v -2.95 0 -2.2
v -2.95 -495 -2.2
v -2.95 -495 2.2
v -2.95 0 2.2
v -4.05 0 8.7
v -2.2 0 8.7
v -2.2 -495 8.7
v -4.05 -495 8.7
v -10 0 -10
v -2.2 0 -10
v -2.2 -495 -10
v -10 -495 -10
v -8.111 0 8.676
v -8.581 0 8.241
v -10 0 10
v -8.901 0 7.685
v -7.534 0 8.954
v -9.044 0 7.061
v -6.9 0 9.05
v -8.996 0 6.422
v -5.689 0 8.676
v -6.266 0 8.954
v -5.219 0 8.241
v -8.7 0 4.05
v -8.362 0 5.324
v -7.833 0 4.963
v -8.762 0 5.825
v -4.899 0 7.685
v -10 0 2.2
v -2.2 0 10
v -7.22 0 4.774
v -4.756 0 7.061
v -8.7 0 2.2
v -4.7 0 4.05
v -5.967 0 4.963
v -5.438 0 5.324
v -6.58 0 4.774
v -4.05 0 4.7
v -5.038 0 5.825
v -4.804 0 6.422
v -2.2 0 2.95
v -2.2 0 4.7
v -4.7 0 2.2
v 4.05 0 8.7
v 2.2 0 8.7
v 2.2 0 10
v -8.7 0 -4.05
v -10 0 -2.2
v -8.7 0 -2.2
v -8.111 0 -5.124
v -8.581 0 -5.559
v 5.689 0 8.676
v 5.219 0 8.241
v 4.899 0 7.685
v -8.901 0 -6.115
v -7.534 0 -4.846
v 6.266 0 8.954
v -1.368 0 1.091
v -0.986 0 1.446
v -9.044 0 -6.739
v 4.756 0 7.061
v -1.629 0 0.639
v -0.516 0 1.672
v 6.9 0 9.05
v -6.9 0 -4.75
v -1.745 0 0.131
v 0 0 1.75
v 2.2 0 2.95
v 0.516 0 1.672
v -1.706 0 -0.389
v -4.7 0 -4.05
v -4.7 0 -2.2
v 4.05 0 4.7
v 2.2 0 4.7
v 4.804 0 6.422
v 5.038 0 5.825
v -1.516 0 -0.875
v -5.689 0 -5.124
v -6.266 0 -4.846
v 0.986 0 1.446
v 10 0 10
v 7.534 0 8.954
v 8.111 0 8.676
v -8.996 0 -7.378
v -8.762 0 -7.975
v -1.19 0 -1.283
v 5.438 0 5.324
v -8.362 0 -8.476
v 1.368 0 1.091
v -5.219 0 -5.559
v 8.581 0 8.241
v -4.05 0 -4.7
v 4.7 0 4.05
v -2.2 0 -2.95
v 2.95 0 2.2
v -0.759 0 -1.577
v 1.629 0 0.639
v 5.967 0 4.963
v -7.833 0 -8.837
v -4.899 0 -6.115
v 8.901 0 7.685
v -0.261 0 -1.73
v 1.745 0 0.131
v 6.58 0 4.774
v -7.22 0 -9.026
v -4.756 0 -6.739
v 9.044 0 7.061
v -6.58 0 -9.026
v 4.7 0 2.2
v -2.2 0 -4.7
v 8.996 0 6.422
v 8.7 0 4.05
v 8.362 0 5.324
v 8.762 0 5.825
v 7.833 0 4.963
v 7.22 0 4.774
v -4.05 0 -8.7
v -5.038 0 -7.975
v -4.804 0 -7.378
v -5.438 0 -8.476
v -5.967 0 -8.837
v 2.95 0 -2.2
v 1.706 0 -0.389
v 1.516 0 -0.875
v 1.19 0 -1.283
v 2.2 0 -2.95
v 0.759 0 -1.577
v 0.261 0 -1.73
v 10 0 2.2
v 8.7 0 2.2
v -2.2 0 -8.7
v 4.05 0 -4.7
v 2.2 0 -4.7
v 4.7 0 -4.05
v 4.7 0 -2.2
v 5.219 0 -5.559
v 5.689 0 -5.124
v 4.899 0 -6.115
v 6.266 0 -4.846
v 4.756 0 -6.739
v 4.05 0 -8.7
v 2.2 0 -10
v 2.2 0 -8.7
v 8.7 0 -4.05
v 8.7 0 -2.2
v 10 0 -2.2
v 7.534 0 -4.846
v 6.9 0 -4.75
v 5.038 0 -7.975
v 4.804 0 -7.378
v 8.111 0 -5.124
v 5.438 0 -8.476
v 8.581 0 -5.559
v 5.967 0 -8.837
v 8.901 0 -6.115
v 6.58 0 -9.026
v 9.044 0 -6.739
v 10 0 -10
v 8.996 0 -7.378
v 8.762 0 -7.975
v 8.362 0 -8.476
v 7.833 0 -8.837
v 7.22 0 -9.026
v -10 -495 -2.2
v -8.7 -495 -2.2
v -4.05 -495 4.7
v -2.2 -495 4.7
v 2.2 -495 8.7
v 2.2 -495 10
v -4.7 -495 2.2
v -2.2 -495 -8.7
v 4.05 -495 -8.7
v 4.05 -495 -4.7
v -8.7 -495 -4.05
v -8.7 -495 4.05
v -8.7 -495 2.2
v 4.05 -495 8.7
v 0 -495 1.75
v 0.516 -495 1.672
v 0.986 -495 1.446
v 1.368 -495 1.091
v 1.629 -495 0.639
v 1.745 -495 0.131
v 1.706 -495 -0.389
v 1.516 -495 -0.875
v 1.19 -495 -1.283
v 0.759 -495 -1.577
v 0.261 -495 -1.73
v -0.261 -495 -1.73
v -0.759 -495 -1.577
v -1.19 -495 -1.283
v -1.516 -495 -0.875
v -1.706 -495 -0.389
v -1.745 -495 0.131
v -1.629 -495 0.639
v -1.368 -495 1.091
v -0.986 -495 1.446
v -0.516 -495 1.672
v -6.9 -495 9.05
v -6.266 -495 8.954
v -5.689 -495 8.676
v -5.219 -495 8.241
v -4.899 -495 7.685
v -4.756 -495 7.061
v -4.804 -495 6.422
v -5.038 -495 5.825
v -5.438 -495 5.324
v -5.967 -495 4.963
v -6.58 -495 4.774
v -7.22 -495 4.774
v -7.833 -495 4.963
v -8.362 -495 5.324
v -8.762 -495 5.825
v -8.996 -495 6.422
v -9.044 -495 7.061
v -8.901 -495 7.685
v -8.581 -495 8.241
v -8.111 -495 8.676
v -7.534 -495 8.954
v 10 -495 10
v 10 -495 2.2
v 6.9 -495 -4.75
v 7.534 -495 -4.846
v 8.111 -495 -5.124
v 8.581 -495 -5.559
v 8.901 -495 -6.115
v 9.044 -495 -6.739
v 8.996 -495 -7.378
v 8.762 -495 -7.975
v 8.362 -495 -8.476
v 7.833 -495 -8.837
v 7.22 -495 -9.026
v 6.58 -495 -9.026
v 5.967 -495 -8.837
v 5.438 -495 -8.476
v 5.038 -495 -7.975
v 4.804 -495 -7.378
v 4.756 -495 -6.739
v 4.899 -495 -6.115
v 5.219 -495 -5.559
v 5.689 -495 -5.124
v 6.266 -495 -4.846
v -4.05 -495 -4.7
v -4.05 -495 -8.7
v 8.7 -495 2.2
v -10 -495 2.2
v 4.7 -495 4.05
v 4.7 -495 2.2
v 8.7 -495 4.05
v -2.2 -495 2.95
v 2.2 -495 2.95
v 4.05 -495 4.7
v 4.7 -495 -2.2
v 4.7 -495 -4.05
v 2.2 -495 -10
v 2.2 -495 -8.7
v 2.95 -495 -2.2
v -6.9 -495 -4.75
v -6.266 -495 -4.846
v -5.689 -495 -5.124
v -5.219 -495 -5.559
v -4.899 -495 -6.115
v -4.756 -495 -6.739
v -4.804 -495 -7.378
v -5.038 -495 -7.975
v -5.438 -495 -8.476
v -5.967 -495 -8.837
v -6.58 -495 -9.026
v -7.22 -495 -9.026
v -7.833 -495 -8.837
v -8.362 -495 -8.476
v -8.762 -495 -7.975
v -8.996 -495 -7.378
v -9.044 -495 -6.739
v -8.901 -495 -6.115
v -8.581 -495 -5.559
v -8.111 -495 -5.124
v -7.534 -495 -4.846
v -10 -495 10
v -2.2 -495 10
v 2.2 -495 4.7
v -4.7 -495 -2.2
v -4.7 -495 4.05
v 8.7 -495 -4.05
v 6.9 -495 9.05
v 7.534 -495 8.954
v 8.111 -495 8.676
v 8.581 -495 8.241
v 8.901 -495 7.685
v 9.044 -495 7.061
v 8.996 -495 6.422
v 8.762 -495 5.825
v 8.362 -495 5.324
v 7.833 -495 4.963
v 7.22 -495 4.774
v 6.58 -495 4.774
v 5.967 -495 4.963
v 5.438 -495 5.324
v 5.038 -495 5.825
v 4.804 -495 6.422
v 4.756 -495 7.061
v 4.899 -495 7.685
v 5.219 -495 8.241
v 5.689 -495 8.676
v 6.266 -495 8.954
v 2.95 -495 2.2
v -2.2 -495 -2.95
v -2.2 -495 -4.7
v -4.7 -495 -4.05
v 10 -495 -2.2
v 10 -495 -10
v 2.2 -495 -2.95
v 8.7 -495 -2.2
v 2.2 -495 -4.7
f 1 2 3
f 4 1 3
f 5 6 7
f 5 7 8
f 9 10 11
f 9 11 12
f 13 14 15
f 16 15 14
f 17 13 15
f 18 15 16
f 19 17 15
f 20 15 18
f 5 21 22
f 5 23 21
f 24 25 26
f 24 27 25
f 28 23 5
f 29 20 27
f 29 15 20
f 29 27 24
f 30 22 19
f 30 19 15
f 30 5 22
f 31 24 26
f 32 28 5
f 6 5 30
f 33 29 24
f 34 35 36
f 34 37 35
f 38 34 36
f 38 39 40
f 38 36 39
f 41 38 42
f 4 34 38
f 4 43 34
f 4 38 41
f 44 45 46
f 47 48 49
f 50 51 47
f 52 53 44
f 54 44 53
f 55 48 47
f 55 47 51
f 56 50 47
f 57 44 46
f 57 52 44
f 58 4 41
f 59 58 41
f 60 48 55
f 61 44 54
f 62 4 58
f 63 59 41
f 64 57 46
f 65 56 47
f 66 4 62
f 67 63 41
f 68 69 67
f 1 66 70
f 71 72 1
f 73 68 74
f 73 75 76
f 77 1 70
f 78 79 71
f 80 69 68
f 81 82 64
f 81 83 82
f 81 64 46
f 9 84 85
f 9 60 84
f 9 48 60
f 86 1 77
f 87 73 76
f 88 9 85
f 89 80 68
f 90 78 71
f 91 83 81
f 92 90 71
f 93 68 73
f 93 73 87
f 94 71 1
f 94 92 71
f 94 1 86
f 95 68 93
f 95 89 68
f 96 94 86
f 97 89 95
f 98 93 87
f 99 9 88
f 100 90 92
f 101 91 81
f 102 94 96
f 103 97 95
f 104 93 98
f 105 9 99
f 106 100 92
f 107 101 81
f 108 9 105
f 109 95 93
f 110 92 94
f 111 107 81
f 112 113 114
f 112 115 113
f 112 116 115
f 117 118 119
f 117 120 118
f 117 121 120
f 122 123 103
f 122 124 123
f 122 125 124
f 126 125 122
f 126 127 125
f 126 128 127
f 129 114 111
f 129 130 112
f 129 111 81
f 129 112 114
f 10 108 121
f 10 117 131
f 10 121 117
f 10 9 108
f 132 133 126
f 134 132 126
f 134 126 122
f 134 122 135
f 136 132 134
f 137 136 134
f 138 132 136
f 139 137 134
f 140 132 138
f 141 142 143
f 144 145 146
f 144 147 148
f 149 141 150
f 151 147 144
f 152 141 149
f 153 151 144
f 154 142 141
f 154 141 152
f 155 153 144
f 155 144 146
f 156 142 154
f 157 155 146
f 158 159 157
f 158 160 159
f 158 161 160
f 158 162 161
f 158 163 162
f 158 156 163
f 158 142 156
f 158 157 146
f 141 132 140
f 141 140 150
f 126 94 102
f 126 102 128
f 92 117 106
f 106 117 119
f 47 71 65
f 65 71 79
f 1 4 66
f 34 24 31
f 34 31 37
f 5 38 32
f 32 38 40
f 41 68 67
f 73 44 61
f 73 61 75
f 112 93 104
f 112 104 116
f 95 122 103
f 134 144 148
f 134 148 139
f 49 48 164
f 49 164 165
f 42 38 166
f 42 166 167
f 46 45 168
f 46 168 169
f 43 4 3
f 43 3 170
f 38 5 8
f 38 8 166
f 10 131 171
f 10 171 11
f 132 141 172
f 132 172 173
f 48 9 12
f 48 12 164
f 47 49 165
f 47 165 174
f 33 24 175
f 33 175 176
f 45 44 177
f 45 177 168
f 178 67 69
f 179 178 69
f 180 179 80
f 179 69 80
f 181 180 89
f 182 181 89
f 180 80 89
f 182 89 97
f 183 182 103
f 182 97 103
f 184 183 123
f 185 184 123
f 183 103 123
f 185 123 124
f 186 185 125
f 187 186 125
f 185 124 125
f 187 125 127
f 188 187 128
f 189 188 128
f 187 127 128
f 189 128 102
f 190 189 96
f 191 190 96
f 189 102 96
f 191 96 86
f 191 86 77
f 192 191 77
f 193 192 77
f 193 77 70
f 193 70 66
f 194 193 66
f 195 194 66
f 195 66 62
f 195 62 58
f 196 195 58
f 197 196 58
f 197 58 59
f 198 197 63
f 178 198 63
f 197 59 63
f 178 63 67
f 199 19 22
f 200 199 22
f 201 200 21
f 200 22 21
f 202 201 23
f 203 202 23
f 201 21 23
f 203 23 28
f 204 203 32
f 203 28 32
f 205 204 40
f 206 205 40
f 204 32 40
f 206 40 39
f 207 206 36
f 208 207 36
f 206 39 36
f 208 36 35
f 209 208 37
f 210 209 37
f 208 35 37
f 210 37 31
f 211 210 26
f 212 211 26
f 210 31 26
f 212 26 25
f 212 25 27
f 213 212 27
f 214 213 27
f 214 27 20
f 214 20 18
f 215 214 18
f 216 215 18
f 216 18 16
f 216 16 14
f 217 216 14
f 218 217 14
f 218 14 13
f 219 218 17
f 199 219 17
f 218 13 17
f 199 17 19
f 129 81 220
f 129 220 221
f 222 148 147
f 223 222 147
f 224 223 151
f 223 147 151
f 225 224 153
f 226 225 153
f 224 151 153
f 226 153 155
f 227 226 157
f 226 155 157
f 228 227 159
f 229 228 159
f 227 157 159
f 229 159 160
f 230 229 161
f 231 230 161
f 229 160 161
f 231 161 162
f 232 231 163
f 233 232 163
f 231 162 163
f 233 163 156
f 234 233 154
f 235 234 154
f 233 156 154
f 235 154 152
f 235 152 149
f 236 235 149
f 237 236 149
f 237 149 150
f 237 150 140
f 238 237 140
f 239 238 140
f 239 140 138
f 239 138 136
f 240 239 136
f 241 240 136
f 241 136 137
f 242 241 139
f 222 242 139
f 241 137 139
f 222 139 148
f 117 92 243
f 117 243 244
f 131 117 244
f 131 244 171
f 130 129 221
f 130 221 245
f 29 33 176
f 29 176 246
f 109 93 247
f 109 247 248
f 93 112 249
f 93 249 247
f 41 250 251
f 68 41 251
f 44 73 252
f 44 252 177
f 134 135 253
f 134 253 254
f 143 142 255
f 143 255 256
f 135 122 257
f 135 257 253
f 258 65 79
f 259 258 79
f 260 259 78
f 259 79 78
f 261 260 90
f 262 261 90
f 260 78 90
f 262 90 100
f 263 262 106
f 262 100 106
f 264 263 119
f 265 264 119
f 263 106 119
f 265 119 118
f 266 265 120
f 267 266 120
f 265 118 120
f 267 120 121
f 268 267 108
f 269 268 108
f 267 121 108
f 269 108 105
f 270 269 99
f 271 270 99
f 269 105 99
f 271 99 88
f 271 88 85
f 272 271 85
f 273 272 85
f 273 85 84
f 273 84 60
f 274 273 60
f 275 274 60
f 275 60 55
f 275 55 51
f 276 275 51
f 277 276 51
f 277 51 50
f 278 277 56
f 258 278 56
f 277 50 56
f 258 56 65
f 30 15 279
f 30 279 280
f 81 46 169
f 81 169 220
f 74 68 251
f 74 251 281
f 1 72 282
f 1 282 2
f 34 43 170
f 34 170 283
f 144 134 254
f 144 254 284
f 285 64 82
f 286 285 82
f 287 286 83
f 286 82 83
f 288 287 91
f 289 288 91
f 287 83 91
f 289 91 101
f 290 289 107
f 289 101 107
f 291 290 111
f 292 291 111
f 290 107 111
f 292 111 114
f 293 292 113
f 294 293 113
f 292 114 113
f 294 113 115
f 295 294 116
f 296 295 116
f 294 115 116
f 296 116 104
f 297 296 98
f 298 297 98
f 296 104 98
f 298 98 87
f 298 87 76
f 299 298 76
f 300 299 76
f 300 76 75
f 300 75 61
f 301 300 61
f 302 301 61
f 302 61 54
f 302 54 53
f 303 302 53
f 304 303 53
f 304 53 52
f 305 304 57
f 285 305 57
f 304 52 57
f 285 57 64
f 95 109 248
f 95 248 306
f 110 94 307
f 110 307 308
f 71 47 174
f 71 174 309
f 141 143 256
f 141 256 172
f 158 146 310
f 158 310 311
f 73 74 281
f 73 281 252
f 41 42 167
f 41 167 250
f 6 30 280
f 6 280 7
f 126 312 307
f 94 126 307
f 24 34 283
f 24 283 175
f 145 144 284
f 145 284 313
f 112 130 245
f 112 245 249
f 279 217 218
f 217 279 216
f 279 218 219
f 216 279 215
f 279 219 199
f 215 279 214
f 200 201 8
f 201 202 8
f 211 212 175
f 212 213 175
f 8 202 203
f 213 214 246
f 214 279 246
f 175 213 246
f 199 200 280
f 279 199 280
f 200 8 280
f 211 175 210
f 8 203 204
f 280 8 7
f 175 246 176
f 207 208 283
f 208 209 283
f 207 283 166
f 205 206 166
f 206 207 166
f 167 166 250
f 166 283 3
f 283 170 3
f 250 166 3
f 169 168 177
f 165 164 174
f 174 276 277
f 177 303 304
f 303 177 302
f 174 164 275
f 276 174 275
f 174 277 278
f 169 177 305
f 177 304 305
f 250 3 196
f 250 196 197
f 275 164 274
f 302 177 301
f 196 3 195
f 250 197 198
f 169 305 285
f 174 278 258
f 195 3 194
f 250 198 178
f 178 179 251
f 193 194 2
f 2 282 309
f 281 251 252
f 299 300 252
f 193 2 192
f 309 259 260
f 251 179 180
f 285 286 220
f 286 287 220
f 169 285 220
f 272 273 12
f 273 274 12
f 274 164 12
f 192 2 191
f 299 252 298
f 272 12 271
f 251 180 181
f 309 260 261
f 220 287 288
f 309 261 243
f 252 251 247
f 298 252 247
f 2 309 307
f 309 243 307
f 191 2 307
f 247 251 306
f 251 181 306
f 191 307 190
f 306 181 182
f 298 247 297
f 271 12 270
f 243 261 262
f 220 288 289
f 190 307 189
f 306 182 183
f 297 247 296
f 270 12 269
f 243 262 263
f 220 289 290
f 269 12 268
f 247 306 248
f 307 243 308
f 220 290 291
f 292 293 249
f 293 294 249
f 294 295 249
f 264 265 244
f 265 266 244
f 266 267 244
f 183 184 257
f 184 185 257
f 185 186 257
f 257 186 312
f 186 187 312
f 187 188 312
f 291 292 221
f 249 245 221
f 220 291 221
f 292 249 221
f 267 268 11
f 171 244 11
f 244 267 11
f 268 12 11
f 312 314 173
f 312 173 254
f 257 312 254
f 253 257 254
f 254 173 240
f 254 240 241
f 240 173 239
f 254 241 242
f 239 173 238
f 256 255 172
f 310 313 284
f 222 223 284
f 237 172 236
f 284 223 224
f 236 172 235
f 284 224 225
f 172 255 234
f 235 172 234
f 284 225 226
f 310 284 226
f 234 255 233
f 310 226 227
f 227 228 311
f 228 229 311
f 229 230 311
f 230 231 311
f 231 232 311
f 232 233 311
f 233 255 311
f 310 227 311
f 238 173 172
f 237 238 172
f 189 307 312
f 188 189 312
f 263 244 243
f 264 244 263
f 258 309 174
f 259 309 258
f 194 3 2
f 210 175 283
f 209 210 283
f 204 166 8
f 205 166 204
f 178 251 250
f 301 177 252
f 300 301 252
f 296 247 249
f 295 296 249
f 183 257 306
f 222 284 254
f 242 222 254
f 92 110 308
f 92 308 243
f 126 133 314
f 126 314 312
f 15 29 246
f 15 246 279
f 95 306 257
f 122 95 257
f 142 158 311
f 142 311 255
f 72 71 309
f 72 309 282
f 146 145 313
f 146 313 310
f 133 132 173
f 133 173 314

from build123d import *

# Parameters (mm, degrees)
SKETCH_1_R      = 2.15
SKETCH_1_R_2    = 1.75
EXTRUDE_1_DEPTH = 495


with BuildPart() as part:
    # 草图1 → 凸台-拉伸1 (new body)
    # profile 1 of 5: a face of its own
    with BuildSketch(Plane(origin=(0, 0, 0), x_dir=(1, 0, 0), z_dir=(0, 1, 0))):
        Polygon((-2.2, 8.7), (-2.2, 10), (-10, 10), (-10, 2.2), (-8.7, 2.2), (-8.7, 4.05), (-4.7, 4.05), (-4.7, 2.2), (-2.95, 2.2), (-2.95, 2.95), (-2.2, 2.95), (-2.2, 4.7), (-4.05, 4.7), (-4.05, 8.7), align=None)
        with Locations(Location((-6.9, 6.9, 0), (0, 0, 270))):
            Circle(SKETCH_1_R, mode=Mode.SUBTRACT)
    # profile 2 of 5: a face of its own
    with BuildSketch(Plane(origin=(0, 0, 0), x_dir=(1, 0, 0), z_dir=(0, 1, 0))):
        Polygon((2.2, 2.95), (-2.2, 2.95), (-2.95, 2.95), (-2.95, 2.2), (-2.95, -2.2), (-2.95, -2.95), (-2.2, -2.95), (2.2, -2.95), (2.95, -2.95), (2.95, -2.2), (2.95, 2.2), (2.95, 2.95), align=None)
        with Locations(Location((0, 0, 0), (0, 0, 270))):
            Circle(SKETCH_1_R_2, mode=Mode.SUBTRACT)
    # profile 3 of 5: a face of its own
    with BuildSketch(Plane(origin=(0, 0, 0), x_dir=(1, 0, 0), z_dir=(0, 1, 0))):
        Polygon((-8.7, -2.2), (-10, -2.2), (-10, -10), (-2.2, -10), (-2.2, -8.7), (-4.05, -8.7), (-4.05, -4.7), (-2.2, -4.7), (-2.2, -2.95), (-2.95, -2.95), (-2.95, -2.2), (-4.7, -2.2), (-4.7, -4.05), (-8.7, -4.05), align=None)
        with Locations(Location((-6.9, -6.9, 0), (0, 0, 270))):
            Circle(SKETCH_1_R, mode=Mode.SUBTRACT)
    # profile 4 of 5: a face of its own
    with BuildSketch(Plane(origin=(0, 0, 0), x_dir=(1, 0, 0), z_dir=(0, 1, 0))):
        Polygon((10, -10), (10, -2.2), (8.7, -2.2), (8.7, -4.05), (4.7, -4.05), (4.7, -2.2), (2.95, -2.2), (2.95, -2.95), (2.2, -2.95), (2.2, -4.7), (4.05, -4.7), (4.05, -8.7), (2.2, -8.7), (2.2, -10), align=None)
        with Locations(Location((6.9, -6.9, 0), (0, 0, 270))):
            Circle(SKETCH_1_R, mode=Mode.SUBTRACT)
    # profile 5 of 5: a face of its own
    with BuildSketch(Plane(origin=(0, 0, 0), x_dir=(1, 0, 0), z_dir=(0, 1, 0))):
        Polygon((10, 10), (2.2, 10), (2.2, 8.7), (4.05, 8.7), (4.05, 4.7), (2.2, 4.7), (2.2, 2.95), (2.95, 2.95), (2.95, 2.2), (4.7, 2.2), (4.7, 4.05), (8.7, 4.05), (8.7, 2.2), (10, 2.2), align=None)
        with Locations(Location((6.9, 6.9, 0), (0, 0, 270))):
            Circle(SKETCH_1_R, mode=Mode.SUBTRACT)
    extrude(amount=-EXTRUDE_1_DEPTH)


solid = part.part
